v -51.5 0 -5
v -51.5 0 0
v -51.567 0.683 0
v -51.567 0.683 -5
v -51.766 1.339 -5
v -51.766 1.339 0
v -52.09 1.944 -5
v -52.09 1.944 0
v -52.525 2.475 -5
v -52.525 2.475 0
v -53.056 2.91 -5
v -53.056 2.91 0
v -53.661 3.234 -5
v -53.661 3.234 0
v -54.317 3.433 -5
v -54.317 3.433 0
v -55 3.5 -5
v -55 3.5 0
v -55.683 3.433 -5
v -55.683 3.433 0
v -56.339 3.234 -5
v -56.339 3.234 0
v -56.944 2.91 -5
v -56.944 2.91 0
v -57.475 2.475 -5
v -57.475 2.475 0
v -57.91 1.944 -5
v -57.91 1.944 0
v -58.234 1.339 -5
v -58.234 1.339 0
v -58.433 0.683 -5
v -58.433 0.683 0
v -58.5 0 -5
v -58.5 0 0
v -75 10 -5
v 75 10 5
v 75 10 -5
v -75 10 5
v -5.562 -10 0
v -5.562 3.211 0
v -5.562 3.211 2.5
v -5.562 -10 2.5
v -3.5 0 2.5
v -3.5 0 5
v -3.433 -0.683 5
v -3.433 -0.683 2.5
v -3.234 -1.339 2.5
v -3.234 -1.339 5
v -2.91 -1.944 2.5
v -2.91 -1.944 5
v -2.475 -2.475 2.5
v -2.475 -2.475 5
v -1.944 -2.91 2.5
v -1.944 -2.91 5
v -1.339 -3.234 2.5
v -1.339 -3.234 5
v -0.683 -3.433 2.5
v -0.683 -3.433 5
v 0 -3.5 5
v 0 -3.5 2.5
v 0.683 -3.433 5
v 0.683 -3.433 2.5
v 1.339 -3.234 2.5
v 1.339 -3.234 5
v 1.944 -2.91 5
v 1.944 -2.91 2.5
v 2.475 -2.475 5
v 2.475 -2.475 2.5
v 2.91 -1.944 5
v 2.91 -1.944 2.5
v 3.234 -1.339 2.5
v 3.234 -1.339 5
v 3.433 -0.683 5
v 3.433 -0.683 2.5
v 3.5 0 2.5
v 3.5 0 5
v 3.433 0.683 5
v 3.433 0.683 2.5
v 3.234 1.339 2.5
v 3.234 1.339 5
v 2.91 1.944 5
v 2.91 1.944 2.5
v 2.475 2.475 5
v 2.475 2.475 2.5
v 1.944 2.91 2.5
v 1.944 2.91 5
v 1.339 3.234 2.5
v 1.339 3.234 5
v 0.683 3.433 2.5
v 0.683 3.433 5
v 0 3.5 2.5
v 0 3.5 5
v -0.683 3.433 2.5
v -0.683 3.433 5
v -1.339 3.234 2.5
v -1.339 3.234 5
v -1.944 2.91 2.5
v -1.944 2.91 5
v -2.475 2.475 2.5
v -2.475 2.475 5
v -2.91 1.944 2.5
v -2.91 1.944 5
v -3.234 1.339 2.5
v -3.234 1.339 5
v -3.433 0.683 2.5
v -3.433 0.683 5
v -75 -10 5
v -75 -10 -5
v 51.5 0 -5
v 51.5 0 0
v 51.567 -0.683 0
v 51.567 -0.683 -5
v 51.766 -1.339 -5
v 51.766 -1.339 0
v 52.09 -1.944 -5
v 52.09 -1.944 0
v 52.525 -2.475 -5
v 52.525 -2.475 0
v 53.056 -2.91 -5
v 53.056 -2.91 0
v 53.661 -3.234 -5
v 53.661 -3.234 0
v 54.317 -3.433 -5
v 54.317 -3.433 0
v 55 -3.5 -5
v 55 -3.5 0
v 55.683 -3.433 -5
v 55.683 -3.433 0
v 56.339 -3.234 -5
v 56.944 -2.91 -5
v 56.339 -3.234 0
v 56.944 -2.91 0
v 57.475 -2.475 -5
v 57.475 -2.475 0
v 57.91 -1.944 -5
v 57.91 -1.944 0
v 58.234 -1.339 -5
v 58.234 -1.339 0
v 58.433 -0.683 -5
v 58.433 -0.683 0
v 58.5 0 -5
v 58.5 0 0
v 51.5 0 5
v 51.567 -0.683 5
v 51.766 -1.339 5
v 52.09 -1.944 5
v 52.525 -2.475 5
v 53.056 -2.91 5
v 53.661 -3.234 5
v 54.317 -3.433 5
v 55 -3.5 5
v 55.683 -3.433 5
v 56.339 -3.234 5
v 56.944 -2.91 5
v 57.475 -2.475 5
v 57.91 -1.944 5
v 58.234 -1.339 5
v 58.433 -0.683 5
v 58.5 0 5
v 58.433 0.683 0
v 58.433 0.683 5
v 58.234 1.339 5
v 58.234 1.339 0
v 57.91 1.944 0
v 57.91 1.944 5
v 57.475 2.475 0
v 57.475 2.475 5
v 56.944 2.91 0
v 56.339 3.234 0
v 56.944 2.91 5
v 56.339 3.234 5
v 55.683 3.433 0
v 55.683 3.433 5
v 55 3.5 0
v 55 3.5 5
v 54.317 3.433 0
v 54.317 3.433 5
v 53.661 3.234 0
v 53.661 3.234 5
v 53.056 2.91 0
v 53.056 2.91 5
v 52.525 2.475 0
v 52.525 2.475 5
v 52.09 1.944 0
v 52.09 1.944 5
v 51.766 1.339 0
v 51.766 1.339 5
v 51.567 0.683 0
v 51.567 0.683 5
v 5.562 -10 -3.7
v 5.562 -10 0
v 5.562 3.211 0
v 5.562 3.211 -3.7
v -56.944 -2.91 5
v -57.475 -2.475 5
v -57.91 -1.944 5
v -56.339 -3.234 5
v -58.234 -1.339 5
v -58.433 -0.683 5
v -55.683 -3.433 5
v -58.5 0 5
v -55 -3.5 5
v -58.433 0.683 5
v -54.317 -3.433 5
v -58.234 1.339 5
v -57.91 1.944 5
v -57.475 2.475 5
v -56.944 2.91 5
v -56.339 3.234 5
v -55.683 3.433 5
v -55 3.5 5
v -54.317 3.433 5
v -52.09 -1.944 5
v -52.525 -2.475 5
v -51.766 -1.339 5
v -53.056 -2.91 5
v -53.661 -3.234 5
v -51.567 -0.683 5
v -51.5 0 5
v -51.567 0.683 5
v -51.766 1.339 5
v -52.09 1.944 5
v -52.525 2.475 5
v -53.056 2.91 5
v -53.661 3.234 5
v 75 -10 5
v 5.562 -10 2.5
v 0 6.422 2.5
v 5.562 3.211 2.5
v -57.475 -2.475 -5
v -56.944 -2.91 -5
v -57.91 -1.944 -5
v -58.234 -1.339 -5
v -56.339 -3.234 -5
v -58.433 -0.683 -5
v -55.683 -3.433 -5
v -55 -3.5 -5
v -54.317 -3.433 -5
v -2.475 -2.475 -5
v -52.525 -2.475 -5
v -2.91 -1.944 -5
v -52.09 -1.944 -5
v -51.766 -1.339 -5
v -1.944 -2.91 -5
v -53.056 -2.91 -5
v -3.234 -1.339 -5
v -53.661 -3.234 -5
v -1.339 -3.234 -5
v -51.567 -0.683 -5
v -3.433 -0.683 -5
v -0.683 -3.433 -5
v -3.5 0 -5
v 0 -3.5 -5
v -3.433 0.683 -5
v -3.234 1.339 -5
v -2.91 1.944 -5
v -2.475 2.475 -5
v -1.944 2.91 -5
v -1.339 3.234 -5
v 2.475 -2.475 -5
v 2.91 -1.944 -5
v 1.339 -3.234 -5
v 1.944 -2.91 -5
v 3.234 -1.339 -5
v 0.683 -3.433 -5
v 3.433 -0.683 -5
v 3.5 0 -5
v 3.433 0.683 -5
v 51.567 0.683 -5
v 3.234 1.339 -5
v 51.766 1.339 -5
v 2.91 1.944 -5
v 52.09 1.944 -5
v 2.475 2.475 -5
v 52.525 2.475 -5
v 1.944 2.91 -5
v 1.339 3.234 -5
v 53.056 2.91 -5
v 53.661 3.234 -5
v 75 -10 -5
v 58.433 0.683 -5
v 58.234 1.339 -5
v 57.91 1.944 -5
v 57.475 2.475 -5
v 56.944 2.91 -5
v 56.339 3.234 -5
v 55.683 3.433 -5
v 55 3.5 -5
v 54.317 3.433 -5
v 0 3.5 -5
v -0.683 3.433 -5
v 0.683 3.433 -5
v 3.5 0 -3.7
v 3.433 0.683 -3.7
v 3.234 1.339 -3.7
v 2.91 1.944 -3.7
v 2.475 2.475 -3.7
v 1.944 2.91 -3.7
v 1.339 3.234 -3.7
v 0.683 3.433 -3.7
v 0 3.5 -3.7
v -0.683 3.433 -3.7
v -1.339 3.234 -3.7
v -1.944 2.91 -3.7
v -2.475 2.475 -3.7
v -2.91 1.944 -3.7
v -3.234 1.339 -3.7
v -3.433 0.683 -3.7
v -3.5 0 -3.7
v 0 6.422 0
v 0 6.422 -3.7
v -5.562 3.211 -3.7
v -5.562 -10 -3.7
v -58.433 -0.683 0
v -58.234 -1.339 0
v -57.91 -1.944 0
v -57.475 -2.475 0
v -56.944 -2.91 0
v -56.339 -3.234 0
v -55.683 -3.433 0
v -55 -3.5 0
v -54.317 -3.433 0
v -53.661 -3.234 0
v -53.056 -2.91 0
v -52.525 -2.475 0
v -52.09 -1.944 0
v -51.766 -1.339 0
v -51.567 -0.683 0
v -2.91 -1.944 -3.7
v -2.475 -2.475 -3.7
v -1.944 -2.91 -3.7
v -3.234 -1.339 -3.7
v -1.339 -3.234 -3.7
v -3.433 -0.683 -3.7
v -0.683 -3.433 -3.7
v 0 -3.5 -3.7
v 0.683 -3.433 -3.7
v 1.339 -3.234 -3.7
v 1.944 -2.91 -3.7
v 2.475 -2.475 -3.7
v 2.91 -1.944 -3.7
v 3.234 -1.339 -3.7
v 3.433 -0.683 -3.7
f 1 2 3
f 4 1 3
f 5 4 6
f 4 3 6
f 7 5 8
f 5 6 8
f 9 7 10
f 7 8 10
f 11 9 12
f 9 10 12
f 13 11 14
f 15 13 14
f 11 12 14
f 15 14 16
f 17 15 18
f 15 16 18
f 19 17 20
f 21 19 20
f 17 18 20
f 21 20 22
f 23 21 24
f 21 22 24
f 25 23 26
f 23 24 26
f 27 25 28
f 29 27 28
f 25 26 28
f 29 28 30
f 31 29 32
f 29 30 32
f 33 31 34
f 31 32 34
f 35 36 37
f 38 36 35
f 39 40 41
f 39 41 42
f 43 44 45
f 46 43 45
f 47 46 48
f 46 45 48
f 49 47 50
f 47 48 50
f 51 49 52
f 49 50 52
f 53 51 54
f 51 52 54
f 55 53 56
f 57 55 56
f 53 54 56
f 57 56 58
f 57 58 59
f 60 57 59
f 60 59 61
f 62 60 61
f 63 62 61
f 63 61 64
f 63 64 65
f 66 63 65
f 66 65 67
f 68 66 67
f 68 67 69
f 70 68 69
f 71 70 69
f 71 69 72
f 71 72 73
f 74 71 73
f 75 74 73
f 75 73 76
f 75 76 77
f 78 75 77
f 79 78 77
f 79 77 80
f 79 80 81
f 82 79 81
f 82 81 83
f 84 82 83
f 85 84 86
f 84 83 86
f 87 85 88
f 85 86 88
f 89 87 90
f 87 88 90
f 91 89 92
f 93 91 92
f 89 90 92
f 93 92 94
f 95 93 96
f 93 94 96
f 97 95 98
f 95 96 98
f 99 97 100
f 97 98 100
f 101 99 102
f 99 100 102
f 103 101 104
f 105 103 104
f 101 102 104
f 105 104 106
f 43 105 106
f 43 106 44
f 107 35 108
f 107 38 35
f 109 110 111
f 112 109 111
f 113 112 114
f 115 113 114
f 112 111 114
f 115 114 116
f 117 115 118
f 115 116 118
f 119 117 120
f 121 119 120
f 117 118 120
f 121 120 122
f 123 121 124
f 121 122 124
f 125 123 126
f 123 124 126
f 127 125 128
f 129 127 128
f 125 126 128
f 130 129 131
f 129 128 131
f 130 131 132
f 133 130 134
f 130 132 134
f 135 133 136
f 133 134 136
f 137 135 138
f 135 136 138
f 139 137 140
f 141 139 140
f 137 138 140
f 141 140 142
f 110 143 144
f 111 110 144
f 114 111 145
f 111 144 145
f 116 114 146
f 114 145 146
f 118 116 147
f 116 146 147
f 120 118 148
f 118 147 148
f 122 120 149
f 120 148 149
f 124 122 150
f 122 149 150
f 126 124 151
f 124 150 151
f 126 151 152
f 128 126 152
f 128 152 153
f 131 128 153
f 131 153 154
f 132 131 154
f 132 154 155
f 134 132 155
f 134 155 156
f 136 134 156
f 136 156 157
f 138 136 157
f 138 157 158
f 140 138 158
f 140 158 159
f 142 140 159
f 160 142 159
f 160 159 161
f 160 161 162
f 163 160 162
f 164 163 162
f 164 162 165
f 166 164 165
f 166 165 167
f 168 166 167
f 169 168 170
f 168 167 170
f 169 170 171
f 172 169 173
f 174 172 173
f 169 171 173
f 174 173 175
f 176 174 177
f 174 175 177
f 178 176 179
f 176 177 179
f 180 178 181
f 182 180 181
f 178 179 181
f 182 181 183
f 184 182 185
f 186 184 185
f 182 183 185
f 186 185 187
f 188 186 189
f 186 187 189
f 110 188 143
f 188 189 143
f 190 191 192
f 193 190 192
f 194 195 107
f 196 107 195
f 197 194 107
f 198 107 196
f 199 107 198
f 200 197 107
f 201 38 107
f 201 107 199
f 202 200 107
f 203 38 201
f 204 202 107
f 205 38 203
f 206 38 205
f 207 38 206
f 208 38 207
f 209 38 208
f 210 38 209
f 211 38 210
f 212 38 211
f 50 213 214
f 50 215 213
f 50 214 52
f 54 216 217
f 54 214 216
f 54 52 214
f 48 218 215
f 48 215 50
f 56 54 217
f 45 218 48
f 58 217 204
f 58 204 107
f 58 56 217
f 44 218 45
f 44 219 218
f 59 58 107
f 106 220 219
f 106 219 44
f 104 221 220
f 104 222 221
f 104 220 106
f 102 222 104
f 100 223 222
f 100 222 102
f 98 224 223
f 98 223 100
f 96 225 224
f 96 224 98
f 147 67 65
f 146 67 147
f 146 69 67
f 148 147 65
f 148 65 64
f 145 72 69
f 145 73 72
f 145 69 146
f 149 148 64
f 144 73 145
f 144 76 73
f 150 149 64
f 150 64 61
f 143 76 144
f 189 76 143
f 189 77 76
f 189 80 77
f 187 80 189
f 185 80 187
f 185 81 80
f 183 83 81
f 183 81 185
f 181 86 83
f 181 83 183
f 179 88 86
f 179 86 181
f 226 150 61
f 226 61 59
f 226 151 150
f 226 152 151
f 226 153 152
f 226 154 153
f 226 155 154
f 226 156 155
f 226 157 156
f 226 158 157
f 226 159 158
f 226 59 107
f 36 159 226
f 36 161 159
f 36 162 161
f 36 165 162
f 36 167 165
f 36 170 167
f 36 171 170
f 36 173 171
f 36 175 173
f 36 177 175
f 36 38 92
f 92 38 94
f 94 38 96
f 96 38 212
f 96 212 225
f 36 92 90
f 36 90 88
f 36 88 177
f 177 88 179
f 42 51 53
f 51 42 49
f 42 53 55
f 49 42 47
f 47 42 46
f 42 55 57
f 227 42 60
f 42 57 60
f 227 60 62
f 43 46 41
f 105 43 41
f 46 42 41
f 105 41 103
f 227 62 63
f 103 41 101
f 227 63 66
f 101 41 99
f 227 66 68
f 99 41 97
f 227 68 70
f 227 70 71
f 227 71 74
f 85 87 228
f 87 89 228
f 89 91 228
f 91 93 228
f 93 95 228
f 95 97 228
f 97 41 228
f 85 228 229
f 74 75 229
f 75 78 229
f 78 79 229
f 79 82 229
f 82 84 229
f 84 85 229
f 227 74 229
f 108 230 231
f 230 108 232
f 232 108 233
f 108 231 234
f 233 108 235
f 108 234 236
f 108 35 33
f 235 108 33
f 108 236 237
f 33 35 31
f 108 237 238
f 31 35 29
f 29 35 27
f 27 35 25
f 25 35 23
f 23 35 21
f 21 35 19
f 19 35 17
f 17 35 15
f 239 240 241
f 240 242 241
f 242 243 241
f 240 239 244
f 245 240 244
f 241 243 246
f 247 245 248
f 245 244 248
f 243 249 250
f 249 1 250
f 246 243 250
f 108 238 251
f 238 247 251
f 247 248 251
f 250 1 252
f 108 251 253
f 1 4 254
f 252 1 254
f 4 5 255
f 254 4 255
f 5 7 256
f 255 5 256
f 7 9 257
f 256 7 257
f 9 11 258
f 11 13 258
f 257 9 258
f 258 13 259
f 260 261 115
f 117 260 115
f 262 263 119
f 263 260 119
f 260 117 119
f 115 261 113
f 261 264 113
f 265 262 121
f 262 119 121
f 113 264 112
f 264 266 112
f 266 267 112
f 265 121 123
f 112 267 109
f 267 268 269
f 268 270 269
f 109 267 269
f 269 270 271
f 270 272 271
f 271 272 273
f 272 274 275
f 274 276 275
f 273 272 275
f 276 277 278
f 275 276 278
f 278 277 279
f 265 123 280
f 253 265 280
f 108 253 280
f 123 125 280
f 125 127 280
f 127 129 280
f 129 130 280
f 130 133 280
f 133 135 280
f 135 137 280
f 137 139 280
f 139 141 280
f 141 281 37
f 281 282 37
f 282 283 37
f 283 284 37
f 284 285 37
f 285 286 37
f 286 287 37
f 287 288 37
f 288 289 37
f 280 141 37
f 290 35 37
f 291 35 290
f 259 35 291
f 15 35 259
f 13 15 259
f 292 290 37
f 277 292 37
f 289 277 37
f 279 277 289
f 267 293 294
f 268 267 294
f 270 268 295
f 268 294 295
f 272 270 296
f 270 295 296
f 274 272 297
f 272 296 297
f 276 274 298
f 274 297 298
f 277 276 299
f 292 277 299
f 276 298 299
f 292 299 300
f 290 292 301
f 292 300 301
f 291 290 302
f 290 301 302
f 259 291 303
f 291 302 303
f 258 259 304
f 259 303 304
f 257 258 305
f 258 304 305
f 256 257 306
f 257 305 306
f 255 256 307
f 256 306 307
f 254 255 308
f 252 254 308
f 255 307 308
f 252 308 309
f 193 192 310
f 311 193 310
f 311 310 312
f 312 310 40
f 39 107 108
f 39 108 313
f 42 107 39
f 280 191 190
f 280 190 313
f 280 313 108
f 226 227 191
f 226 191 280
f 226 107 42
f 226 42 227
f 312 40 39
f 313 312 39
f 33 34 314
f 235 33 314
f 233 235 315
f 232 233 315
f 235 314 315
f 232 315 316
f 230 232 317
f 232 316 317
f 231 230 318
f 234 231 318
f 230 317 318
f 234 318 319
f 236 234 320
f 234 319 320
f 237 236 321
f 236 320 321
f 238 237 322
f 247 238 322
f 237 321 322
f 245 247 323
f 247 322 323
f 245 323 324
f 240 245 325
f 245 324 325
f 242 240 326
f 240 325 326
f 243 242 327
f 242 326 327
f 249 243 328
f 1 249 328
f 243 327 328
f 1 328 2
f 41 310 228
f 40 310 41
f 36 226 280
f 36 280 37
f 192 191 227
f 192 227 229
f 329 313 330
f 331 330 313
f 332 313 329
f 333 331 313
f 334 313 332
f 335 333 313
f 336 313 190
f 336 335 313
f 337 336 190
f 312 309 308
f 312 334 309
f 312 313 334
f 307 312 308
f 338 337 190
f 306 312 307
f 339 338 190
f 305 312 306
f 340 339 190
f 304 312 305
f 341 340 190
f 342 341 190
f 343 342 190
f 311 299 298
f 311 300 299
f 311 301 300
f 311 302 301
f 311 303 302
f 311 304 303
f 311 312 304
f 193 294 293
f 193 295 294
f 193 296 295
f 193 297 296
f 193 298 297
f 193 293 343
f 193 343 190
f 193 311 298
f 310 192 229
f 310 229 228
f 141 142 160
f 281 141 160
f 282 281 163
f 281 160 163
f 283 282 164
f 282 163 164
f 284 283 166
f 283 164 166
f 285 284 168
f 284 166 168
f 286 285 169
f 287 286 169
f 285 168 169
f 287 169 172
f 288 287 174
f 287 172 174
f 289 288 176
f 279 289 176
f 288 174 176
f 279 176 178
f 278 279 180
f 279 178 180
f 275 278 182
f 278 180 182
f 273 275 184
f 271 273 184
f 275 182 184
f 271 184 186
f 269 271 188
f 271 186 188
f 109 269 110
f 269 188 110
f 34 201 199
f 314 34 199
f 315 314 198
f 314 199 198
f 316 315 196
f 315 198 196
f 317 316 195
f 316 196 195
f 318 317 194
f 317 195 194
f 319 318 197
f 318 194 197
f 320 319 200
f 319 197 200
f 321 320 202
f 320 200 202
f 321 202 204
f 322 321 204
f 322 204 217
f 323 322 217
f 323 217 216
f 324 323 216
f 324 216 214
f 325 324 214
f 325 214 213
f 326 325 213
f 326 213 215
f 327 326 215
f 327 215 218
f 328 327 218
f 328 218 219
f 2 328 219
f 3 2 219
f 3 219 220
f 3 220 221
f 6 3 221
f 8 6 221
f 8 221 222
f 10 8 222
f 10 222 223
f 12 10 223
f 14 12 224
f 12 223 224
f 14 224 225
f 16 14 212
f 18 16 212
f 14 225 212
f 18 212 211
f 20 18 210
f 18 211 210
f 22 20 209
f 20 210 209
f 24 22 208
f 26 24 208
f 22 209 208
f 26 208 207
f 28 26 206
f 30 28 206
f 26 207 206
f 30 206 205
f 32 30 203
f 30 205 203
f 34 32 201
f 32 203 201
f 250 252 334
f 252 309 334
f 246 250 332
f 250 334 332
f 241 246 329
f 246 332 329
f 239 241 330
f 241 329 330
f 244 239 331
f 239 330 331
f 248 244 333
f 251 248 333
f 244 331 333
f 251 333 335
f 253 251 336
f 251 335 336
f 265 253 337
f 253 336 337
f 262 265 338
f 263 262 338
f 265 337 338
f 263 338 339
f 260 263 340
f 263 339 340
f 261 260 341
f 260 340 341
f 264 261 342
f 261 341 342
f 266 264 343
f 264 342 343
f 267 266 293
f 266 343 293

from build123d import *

# Parameters (mm, degrees)
F0_W          = 11.124
F0_H          = 6.4224443945
F1_DEPTH      = 5
F1_DEPTH_BACK = 5
F2_D          = 7
F2_DEPTH      = 5.001
F3_D          = 7
F4_DEPTH      = 2.5
F4_DEPTH_BACK = 3.7


with BuildPart() as f1:
    # F0 (on Top) → F1 (new body, two sides)
    with BuildSketch(Plane.XY) as f1_sk:
        Polygon((-5.562, 10), (-75, 10), (-75, -10), (-5.562, -10), (-5.562, -3.2112221972), (-5.562, 3.2112221972), align=None)
        Polygon((75, 10), (5.562, 10), (5.562, 3.2112221972), (5.562, -3.2112221972), (5.562, -10), (75, -10), align=None)
        Polygon((0, 6.4224443945), (-5.562, 3.2112221972), (5.562, 3.2112221972), align=None)
        Polygon((5.562, 10), (-5.562, 10), (-5.562, 3.2112221972), (0, 6.4224443945), (5.562, 3.2112221972), align=None)
        Polygon((-5.562, -3.2112221972), (-5.562, -10), (5.562, -10), (5.562, -3.2112221972), (0, -6.4224443945), align=None)
        Polygon((5.562, -3.2112221972), (-5.562, -3.2112221972), (0, -6.4224443945), align=None)
        Rectangle(F0_W, F0_H)
    extrude(amount=F1_DEPTH)
    extrude(f1_sk.sketch, amount=-F1_DEPTH_BACK)

    # F2 (through all, one way)
    with BuildSketch(Plane.XY):
        with Locations((-55, 0), (55, 0), (0, 0)):
            Circle(F2_D / 2)
    extrude(amount=-F2_DEPTH, mode=Mode.SUBTRACT)

    # F3 (through all)
    with Locations(Plane(origin=(0, 0, 0), x_dir=(1, 0, 0), z_dir=(0, 0, -1))):
        with Locations((55, 0), (-55, 0), (0, 0)):
            Hole(F3_D / 2)

    # F0 (on Top) → F4 (cut, two sides)
    with BuildSketch(Plane.XY) as f4_sk:
        Polygon((0, 6.4224443945), (-5.562, 3.2112221972), (5.562, 3.2112221972), align=None)
        Rectangle(F0_W, F0_H)
        Polygon((5.562, -3.2112221972), (-5.562, -3.2112221972), (0, -6.4224443945), align=None)
        Polygon((-5.562, -3.2112221972), (-5.562, -10), (5.562, -10), (5.562, -3.2112221972), (0, -6.4224443945), align=None)
    extrude(amount=F4_DEPTH, mode=Mode.SUBTRACT)
    extrude(f4_sk.sketch, amount=-F4_DEPTH_BACK, mode=Mode.SUBTRACT)


solid = f1.part
